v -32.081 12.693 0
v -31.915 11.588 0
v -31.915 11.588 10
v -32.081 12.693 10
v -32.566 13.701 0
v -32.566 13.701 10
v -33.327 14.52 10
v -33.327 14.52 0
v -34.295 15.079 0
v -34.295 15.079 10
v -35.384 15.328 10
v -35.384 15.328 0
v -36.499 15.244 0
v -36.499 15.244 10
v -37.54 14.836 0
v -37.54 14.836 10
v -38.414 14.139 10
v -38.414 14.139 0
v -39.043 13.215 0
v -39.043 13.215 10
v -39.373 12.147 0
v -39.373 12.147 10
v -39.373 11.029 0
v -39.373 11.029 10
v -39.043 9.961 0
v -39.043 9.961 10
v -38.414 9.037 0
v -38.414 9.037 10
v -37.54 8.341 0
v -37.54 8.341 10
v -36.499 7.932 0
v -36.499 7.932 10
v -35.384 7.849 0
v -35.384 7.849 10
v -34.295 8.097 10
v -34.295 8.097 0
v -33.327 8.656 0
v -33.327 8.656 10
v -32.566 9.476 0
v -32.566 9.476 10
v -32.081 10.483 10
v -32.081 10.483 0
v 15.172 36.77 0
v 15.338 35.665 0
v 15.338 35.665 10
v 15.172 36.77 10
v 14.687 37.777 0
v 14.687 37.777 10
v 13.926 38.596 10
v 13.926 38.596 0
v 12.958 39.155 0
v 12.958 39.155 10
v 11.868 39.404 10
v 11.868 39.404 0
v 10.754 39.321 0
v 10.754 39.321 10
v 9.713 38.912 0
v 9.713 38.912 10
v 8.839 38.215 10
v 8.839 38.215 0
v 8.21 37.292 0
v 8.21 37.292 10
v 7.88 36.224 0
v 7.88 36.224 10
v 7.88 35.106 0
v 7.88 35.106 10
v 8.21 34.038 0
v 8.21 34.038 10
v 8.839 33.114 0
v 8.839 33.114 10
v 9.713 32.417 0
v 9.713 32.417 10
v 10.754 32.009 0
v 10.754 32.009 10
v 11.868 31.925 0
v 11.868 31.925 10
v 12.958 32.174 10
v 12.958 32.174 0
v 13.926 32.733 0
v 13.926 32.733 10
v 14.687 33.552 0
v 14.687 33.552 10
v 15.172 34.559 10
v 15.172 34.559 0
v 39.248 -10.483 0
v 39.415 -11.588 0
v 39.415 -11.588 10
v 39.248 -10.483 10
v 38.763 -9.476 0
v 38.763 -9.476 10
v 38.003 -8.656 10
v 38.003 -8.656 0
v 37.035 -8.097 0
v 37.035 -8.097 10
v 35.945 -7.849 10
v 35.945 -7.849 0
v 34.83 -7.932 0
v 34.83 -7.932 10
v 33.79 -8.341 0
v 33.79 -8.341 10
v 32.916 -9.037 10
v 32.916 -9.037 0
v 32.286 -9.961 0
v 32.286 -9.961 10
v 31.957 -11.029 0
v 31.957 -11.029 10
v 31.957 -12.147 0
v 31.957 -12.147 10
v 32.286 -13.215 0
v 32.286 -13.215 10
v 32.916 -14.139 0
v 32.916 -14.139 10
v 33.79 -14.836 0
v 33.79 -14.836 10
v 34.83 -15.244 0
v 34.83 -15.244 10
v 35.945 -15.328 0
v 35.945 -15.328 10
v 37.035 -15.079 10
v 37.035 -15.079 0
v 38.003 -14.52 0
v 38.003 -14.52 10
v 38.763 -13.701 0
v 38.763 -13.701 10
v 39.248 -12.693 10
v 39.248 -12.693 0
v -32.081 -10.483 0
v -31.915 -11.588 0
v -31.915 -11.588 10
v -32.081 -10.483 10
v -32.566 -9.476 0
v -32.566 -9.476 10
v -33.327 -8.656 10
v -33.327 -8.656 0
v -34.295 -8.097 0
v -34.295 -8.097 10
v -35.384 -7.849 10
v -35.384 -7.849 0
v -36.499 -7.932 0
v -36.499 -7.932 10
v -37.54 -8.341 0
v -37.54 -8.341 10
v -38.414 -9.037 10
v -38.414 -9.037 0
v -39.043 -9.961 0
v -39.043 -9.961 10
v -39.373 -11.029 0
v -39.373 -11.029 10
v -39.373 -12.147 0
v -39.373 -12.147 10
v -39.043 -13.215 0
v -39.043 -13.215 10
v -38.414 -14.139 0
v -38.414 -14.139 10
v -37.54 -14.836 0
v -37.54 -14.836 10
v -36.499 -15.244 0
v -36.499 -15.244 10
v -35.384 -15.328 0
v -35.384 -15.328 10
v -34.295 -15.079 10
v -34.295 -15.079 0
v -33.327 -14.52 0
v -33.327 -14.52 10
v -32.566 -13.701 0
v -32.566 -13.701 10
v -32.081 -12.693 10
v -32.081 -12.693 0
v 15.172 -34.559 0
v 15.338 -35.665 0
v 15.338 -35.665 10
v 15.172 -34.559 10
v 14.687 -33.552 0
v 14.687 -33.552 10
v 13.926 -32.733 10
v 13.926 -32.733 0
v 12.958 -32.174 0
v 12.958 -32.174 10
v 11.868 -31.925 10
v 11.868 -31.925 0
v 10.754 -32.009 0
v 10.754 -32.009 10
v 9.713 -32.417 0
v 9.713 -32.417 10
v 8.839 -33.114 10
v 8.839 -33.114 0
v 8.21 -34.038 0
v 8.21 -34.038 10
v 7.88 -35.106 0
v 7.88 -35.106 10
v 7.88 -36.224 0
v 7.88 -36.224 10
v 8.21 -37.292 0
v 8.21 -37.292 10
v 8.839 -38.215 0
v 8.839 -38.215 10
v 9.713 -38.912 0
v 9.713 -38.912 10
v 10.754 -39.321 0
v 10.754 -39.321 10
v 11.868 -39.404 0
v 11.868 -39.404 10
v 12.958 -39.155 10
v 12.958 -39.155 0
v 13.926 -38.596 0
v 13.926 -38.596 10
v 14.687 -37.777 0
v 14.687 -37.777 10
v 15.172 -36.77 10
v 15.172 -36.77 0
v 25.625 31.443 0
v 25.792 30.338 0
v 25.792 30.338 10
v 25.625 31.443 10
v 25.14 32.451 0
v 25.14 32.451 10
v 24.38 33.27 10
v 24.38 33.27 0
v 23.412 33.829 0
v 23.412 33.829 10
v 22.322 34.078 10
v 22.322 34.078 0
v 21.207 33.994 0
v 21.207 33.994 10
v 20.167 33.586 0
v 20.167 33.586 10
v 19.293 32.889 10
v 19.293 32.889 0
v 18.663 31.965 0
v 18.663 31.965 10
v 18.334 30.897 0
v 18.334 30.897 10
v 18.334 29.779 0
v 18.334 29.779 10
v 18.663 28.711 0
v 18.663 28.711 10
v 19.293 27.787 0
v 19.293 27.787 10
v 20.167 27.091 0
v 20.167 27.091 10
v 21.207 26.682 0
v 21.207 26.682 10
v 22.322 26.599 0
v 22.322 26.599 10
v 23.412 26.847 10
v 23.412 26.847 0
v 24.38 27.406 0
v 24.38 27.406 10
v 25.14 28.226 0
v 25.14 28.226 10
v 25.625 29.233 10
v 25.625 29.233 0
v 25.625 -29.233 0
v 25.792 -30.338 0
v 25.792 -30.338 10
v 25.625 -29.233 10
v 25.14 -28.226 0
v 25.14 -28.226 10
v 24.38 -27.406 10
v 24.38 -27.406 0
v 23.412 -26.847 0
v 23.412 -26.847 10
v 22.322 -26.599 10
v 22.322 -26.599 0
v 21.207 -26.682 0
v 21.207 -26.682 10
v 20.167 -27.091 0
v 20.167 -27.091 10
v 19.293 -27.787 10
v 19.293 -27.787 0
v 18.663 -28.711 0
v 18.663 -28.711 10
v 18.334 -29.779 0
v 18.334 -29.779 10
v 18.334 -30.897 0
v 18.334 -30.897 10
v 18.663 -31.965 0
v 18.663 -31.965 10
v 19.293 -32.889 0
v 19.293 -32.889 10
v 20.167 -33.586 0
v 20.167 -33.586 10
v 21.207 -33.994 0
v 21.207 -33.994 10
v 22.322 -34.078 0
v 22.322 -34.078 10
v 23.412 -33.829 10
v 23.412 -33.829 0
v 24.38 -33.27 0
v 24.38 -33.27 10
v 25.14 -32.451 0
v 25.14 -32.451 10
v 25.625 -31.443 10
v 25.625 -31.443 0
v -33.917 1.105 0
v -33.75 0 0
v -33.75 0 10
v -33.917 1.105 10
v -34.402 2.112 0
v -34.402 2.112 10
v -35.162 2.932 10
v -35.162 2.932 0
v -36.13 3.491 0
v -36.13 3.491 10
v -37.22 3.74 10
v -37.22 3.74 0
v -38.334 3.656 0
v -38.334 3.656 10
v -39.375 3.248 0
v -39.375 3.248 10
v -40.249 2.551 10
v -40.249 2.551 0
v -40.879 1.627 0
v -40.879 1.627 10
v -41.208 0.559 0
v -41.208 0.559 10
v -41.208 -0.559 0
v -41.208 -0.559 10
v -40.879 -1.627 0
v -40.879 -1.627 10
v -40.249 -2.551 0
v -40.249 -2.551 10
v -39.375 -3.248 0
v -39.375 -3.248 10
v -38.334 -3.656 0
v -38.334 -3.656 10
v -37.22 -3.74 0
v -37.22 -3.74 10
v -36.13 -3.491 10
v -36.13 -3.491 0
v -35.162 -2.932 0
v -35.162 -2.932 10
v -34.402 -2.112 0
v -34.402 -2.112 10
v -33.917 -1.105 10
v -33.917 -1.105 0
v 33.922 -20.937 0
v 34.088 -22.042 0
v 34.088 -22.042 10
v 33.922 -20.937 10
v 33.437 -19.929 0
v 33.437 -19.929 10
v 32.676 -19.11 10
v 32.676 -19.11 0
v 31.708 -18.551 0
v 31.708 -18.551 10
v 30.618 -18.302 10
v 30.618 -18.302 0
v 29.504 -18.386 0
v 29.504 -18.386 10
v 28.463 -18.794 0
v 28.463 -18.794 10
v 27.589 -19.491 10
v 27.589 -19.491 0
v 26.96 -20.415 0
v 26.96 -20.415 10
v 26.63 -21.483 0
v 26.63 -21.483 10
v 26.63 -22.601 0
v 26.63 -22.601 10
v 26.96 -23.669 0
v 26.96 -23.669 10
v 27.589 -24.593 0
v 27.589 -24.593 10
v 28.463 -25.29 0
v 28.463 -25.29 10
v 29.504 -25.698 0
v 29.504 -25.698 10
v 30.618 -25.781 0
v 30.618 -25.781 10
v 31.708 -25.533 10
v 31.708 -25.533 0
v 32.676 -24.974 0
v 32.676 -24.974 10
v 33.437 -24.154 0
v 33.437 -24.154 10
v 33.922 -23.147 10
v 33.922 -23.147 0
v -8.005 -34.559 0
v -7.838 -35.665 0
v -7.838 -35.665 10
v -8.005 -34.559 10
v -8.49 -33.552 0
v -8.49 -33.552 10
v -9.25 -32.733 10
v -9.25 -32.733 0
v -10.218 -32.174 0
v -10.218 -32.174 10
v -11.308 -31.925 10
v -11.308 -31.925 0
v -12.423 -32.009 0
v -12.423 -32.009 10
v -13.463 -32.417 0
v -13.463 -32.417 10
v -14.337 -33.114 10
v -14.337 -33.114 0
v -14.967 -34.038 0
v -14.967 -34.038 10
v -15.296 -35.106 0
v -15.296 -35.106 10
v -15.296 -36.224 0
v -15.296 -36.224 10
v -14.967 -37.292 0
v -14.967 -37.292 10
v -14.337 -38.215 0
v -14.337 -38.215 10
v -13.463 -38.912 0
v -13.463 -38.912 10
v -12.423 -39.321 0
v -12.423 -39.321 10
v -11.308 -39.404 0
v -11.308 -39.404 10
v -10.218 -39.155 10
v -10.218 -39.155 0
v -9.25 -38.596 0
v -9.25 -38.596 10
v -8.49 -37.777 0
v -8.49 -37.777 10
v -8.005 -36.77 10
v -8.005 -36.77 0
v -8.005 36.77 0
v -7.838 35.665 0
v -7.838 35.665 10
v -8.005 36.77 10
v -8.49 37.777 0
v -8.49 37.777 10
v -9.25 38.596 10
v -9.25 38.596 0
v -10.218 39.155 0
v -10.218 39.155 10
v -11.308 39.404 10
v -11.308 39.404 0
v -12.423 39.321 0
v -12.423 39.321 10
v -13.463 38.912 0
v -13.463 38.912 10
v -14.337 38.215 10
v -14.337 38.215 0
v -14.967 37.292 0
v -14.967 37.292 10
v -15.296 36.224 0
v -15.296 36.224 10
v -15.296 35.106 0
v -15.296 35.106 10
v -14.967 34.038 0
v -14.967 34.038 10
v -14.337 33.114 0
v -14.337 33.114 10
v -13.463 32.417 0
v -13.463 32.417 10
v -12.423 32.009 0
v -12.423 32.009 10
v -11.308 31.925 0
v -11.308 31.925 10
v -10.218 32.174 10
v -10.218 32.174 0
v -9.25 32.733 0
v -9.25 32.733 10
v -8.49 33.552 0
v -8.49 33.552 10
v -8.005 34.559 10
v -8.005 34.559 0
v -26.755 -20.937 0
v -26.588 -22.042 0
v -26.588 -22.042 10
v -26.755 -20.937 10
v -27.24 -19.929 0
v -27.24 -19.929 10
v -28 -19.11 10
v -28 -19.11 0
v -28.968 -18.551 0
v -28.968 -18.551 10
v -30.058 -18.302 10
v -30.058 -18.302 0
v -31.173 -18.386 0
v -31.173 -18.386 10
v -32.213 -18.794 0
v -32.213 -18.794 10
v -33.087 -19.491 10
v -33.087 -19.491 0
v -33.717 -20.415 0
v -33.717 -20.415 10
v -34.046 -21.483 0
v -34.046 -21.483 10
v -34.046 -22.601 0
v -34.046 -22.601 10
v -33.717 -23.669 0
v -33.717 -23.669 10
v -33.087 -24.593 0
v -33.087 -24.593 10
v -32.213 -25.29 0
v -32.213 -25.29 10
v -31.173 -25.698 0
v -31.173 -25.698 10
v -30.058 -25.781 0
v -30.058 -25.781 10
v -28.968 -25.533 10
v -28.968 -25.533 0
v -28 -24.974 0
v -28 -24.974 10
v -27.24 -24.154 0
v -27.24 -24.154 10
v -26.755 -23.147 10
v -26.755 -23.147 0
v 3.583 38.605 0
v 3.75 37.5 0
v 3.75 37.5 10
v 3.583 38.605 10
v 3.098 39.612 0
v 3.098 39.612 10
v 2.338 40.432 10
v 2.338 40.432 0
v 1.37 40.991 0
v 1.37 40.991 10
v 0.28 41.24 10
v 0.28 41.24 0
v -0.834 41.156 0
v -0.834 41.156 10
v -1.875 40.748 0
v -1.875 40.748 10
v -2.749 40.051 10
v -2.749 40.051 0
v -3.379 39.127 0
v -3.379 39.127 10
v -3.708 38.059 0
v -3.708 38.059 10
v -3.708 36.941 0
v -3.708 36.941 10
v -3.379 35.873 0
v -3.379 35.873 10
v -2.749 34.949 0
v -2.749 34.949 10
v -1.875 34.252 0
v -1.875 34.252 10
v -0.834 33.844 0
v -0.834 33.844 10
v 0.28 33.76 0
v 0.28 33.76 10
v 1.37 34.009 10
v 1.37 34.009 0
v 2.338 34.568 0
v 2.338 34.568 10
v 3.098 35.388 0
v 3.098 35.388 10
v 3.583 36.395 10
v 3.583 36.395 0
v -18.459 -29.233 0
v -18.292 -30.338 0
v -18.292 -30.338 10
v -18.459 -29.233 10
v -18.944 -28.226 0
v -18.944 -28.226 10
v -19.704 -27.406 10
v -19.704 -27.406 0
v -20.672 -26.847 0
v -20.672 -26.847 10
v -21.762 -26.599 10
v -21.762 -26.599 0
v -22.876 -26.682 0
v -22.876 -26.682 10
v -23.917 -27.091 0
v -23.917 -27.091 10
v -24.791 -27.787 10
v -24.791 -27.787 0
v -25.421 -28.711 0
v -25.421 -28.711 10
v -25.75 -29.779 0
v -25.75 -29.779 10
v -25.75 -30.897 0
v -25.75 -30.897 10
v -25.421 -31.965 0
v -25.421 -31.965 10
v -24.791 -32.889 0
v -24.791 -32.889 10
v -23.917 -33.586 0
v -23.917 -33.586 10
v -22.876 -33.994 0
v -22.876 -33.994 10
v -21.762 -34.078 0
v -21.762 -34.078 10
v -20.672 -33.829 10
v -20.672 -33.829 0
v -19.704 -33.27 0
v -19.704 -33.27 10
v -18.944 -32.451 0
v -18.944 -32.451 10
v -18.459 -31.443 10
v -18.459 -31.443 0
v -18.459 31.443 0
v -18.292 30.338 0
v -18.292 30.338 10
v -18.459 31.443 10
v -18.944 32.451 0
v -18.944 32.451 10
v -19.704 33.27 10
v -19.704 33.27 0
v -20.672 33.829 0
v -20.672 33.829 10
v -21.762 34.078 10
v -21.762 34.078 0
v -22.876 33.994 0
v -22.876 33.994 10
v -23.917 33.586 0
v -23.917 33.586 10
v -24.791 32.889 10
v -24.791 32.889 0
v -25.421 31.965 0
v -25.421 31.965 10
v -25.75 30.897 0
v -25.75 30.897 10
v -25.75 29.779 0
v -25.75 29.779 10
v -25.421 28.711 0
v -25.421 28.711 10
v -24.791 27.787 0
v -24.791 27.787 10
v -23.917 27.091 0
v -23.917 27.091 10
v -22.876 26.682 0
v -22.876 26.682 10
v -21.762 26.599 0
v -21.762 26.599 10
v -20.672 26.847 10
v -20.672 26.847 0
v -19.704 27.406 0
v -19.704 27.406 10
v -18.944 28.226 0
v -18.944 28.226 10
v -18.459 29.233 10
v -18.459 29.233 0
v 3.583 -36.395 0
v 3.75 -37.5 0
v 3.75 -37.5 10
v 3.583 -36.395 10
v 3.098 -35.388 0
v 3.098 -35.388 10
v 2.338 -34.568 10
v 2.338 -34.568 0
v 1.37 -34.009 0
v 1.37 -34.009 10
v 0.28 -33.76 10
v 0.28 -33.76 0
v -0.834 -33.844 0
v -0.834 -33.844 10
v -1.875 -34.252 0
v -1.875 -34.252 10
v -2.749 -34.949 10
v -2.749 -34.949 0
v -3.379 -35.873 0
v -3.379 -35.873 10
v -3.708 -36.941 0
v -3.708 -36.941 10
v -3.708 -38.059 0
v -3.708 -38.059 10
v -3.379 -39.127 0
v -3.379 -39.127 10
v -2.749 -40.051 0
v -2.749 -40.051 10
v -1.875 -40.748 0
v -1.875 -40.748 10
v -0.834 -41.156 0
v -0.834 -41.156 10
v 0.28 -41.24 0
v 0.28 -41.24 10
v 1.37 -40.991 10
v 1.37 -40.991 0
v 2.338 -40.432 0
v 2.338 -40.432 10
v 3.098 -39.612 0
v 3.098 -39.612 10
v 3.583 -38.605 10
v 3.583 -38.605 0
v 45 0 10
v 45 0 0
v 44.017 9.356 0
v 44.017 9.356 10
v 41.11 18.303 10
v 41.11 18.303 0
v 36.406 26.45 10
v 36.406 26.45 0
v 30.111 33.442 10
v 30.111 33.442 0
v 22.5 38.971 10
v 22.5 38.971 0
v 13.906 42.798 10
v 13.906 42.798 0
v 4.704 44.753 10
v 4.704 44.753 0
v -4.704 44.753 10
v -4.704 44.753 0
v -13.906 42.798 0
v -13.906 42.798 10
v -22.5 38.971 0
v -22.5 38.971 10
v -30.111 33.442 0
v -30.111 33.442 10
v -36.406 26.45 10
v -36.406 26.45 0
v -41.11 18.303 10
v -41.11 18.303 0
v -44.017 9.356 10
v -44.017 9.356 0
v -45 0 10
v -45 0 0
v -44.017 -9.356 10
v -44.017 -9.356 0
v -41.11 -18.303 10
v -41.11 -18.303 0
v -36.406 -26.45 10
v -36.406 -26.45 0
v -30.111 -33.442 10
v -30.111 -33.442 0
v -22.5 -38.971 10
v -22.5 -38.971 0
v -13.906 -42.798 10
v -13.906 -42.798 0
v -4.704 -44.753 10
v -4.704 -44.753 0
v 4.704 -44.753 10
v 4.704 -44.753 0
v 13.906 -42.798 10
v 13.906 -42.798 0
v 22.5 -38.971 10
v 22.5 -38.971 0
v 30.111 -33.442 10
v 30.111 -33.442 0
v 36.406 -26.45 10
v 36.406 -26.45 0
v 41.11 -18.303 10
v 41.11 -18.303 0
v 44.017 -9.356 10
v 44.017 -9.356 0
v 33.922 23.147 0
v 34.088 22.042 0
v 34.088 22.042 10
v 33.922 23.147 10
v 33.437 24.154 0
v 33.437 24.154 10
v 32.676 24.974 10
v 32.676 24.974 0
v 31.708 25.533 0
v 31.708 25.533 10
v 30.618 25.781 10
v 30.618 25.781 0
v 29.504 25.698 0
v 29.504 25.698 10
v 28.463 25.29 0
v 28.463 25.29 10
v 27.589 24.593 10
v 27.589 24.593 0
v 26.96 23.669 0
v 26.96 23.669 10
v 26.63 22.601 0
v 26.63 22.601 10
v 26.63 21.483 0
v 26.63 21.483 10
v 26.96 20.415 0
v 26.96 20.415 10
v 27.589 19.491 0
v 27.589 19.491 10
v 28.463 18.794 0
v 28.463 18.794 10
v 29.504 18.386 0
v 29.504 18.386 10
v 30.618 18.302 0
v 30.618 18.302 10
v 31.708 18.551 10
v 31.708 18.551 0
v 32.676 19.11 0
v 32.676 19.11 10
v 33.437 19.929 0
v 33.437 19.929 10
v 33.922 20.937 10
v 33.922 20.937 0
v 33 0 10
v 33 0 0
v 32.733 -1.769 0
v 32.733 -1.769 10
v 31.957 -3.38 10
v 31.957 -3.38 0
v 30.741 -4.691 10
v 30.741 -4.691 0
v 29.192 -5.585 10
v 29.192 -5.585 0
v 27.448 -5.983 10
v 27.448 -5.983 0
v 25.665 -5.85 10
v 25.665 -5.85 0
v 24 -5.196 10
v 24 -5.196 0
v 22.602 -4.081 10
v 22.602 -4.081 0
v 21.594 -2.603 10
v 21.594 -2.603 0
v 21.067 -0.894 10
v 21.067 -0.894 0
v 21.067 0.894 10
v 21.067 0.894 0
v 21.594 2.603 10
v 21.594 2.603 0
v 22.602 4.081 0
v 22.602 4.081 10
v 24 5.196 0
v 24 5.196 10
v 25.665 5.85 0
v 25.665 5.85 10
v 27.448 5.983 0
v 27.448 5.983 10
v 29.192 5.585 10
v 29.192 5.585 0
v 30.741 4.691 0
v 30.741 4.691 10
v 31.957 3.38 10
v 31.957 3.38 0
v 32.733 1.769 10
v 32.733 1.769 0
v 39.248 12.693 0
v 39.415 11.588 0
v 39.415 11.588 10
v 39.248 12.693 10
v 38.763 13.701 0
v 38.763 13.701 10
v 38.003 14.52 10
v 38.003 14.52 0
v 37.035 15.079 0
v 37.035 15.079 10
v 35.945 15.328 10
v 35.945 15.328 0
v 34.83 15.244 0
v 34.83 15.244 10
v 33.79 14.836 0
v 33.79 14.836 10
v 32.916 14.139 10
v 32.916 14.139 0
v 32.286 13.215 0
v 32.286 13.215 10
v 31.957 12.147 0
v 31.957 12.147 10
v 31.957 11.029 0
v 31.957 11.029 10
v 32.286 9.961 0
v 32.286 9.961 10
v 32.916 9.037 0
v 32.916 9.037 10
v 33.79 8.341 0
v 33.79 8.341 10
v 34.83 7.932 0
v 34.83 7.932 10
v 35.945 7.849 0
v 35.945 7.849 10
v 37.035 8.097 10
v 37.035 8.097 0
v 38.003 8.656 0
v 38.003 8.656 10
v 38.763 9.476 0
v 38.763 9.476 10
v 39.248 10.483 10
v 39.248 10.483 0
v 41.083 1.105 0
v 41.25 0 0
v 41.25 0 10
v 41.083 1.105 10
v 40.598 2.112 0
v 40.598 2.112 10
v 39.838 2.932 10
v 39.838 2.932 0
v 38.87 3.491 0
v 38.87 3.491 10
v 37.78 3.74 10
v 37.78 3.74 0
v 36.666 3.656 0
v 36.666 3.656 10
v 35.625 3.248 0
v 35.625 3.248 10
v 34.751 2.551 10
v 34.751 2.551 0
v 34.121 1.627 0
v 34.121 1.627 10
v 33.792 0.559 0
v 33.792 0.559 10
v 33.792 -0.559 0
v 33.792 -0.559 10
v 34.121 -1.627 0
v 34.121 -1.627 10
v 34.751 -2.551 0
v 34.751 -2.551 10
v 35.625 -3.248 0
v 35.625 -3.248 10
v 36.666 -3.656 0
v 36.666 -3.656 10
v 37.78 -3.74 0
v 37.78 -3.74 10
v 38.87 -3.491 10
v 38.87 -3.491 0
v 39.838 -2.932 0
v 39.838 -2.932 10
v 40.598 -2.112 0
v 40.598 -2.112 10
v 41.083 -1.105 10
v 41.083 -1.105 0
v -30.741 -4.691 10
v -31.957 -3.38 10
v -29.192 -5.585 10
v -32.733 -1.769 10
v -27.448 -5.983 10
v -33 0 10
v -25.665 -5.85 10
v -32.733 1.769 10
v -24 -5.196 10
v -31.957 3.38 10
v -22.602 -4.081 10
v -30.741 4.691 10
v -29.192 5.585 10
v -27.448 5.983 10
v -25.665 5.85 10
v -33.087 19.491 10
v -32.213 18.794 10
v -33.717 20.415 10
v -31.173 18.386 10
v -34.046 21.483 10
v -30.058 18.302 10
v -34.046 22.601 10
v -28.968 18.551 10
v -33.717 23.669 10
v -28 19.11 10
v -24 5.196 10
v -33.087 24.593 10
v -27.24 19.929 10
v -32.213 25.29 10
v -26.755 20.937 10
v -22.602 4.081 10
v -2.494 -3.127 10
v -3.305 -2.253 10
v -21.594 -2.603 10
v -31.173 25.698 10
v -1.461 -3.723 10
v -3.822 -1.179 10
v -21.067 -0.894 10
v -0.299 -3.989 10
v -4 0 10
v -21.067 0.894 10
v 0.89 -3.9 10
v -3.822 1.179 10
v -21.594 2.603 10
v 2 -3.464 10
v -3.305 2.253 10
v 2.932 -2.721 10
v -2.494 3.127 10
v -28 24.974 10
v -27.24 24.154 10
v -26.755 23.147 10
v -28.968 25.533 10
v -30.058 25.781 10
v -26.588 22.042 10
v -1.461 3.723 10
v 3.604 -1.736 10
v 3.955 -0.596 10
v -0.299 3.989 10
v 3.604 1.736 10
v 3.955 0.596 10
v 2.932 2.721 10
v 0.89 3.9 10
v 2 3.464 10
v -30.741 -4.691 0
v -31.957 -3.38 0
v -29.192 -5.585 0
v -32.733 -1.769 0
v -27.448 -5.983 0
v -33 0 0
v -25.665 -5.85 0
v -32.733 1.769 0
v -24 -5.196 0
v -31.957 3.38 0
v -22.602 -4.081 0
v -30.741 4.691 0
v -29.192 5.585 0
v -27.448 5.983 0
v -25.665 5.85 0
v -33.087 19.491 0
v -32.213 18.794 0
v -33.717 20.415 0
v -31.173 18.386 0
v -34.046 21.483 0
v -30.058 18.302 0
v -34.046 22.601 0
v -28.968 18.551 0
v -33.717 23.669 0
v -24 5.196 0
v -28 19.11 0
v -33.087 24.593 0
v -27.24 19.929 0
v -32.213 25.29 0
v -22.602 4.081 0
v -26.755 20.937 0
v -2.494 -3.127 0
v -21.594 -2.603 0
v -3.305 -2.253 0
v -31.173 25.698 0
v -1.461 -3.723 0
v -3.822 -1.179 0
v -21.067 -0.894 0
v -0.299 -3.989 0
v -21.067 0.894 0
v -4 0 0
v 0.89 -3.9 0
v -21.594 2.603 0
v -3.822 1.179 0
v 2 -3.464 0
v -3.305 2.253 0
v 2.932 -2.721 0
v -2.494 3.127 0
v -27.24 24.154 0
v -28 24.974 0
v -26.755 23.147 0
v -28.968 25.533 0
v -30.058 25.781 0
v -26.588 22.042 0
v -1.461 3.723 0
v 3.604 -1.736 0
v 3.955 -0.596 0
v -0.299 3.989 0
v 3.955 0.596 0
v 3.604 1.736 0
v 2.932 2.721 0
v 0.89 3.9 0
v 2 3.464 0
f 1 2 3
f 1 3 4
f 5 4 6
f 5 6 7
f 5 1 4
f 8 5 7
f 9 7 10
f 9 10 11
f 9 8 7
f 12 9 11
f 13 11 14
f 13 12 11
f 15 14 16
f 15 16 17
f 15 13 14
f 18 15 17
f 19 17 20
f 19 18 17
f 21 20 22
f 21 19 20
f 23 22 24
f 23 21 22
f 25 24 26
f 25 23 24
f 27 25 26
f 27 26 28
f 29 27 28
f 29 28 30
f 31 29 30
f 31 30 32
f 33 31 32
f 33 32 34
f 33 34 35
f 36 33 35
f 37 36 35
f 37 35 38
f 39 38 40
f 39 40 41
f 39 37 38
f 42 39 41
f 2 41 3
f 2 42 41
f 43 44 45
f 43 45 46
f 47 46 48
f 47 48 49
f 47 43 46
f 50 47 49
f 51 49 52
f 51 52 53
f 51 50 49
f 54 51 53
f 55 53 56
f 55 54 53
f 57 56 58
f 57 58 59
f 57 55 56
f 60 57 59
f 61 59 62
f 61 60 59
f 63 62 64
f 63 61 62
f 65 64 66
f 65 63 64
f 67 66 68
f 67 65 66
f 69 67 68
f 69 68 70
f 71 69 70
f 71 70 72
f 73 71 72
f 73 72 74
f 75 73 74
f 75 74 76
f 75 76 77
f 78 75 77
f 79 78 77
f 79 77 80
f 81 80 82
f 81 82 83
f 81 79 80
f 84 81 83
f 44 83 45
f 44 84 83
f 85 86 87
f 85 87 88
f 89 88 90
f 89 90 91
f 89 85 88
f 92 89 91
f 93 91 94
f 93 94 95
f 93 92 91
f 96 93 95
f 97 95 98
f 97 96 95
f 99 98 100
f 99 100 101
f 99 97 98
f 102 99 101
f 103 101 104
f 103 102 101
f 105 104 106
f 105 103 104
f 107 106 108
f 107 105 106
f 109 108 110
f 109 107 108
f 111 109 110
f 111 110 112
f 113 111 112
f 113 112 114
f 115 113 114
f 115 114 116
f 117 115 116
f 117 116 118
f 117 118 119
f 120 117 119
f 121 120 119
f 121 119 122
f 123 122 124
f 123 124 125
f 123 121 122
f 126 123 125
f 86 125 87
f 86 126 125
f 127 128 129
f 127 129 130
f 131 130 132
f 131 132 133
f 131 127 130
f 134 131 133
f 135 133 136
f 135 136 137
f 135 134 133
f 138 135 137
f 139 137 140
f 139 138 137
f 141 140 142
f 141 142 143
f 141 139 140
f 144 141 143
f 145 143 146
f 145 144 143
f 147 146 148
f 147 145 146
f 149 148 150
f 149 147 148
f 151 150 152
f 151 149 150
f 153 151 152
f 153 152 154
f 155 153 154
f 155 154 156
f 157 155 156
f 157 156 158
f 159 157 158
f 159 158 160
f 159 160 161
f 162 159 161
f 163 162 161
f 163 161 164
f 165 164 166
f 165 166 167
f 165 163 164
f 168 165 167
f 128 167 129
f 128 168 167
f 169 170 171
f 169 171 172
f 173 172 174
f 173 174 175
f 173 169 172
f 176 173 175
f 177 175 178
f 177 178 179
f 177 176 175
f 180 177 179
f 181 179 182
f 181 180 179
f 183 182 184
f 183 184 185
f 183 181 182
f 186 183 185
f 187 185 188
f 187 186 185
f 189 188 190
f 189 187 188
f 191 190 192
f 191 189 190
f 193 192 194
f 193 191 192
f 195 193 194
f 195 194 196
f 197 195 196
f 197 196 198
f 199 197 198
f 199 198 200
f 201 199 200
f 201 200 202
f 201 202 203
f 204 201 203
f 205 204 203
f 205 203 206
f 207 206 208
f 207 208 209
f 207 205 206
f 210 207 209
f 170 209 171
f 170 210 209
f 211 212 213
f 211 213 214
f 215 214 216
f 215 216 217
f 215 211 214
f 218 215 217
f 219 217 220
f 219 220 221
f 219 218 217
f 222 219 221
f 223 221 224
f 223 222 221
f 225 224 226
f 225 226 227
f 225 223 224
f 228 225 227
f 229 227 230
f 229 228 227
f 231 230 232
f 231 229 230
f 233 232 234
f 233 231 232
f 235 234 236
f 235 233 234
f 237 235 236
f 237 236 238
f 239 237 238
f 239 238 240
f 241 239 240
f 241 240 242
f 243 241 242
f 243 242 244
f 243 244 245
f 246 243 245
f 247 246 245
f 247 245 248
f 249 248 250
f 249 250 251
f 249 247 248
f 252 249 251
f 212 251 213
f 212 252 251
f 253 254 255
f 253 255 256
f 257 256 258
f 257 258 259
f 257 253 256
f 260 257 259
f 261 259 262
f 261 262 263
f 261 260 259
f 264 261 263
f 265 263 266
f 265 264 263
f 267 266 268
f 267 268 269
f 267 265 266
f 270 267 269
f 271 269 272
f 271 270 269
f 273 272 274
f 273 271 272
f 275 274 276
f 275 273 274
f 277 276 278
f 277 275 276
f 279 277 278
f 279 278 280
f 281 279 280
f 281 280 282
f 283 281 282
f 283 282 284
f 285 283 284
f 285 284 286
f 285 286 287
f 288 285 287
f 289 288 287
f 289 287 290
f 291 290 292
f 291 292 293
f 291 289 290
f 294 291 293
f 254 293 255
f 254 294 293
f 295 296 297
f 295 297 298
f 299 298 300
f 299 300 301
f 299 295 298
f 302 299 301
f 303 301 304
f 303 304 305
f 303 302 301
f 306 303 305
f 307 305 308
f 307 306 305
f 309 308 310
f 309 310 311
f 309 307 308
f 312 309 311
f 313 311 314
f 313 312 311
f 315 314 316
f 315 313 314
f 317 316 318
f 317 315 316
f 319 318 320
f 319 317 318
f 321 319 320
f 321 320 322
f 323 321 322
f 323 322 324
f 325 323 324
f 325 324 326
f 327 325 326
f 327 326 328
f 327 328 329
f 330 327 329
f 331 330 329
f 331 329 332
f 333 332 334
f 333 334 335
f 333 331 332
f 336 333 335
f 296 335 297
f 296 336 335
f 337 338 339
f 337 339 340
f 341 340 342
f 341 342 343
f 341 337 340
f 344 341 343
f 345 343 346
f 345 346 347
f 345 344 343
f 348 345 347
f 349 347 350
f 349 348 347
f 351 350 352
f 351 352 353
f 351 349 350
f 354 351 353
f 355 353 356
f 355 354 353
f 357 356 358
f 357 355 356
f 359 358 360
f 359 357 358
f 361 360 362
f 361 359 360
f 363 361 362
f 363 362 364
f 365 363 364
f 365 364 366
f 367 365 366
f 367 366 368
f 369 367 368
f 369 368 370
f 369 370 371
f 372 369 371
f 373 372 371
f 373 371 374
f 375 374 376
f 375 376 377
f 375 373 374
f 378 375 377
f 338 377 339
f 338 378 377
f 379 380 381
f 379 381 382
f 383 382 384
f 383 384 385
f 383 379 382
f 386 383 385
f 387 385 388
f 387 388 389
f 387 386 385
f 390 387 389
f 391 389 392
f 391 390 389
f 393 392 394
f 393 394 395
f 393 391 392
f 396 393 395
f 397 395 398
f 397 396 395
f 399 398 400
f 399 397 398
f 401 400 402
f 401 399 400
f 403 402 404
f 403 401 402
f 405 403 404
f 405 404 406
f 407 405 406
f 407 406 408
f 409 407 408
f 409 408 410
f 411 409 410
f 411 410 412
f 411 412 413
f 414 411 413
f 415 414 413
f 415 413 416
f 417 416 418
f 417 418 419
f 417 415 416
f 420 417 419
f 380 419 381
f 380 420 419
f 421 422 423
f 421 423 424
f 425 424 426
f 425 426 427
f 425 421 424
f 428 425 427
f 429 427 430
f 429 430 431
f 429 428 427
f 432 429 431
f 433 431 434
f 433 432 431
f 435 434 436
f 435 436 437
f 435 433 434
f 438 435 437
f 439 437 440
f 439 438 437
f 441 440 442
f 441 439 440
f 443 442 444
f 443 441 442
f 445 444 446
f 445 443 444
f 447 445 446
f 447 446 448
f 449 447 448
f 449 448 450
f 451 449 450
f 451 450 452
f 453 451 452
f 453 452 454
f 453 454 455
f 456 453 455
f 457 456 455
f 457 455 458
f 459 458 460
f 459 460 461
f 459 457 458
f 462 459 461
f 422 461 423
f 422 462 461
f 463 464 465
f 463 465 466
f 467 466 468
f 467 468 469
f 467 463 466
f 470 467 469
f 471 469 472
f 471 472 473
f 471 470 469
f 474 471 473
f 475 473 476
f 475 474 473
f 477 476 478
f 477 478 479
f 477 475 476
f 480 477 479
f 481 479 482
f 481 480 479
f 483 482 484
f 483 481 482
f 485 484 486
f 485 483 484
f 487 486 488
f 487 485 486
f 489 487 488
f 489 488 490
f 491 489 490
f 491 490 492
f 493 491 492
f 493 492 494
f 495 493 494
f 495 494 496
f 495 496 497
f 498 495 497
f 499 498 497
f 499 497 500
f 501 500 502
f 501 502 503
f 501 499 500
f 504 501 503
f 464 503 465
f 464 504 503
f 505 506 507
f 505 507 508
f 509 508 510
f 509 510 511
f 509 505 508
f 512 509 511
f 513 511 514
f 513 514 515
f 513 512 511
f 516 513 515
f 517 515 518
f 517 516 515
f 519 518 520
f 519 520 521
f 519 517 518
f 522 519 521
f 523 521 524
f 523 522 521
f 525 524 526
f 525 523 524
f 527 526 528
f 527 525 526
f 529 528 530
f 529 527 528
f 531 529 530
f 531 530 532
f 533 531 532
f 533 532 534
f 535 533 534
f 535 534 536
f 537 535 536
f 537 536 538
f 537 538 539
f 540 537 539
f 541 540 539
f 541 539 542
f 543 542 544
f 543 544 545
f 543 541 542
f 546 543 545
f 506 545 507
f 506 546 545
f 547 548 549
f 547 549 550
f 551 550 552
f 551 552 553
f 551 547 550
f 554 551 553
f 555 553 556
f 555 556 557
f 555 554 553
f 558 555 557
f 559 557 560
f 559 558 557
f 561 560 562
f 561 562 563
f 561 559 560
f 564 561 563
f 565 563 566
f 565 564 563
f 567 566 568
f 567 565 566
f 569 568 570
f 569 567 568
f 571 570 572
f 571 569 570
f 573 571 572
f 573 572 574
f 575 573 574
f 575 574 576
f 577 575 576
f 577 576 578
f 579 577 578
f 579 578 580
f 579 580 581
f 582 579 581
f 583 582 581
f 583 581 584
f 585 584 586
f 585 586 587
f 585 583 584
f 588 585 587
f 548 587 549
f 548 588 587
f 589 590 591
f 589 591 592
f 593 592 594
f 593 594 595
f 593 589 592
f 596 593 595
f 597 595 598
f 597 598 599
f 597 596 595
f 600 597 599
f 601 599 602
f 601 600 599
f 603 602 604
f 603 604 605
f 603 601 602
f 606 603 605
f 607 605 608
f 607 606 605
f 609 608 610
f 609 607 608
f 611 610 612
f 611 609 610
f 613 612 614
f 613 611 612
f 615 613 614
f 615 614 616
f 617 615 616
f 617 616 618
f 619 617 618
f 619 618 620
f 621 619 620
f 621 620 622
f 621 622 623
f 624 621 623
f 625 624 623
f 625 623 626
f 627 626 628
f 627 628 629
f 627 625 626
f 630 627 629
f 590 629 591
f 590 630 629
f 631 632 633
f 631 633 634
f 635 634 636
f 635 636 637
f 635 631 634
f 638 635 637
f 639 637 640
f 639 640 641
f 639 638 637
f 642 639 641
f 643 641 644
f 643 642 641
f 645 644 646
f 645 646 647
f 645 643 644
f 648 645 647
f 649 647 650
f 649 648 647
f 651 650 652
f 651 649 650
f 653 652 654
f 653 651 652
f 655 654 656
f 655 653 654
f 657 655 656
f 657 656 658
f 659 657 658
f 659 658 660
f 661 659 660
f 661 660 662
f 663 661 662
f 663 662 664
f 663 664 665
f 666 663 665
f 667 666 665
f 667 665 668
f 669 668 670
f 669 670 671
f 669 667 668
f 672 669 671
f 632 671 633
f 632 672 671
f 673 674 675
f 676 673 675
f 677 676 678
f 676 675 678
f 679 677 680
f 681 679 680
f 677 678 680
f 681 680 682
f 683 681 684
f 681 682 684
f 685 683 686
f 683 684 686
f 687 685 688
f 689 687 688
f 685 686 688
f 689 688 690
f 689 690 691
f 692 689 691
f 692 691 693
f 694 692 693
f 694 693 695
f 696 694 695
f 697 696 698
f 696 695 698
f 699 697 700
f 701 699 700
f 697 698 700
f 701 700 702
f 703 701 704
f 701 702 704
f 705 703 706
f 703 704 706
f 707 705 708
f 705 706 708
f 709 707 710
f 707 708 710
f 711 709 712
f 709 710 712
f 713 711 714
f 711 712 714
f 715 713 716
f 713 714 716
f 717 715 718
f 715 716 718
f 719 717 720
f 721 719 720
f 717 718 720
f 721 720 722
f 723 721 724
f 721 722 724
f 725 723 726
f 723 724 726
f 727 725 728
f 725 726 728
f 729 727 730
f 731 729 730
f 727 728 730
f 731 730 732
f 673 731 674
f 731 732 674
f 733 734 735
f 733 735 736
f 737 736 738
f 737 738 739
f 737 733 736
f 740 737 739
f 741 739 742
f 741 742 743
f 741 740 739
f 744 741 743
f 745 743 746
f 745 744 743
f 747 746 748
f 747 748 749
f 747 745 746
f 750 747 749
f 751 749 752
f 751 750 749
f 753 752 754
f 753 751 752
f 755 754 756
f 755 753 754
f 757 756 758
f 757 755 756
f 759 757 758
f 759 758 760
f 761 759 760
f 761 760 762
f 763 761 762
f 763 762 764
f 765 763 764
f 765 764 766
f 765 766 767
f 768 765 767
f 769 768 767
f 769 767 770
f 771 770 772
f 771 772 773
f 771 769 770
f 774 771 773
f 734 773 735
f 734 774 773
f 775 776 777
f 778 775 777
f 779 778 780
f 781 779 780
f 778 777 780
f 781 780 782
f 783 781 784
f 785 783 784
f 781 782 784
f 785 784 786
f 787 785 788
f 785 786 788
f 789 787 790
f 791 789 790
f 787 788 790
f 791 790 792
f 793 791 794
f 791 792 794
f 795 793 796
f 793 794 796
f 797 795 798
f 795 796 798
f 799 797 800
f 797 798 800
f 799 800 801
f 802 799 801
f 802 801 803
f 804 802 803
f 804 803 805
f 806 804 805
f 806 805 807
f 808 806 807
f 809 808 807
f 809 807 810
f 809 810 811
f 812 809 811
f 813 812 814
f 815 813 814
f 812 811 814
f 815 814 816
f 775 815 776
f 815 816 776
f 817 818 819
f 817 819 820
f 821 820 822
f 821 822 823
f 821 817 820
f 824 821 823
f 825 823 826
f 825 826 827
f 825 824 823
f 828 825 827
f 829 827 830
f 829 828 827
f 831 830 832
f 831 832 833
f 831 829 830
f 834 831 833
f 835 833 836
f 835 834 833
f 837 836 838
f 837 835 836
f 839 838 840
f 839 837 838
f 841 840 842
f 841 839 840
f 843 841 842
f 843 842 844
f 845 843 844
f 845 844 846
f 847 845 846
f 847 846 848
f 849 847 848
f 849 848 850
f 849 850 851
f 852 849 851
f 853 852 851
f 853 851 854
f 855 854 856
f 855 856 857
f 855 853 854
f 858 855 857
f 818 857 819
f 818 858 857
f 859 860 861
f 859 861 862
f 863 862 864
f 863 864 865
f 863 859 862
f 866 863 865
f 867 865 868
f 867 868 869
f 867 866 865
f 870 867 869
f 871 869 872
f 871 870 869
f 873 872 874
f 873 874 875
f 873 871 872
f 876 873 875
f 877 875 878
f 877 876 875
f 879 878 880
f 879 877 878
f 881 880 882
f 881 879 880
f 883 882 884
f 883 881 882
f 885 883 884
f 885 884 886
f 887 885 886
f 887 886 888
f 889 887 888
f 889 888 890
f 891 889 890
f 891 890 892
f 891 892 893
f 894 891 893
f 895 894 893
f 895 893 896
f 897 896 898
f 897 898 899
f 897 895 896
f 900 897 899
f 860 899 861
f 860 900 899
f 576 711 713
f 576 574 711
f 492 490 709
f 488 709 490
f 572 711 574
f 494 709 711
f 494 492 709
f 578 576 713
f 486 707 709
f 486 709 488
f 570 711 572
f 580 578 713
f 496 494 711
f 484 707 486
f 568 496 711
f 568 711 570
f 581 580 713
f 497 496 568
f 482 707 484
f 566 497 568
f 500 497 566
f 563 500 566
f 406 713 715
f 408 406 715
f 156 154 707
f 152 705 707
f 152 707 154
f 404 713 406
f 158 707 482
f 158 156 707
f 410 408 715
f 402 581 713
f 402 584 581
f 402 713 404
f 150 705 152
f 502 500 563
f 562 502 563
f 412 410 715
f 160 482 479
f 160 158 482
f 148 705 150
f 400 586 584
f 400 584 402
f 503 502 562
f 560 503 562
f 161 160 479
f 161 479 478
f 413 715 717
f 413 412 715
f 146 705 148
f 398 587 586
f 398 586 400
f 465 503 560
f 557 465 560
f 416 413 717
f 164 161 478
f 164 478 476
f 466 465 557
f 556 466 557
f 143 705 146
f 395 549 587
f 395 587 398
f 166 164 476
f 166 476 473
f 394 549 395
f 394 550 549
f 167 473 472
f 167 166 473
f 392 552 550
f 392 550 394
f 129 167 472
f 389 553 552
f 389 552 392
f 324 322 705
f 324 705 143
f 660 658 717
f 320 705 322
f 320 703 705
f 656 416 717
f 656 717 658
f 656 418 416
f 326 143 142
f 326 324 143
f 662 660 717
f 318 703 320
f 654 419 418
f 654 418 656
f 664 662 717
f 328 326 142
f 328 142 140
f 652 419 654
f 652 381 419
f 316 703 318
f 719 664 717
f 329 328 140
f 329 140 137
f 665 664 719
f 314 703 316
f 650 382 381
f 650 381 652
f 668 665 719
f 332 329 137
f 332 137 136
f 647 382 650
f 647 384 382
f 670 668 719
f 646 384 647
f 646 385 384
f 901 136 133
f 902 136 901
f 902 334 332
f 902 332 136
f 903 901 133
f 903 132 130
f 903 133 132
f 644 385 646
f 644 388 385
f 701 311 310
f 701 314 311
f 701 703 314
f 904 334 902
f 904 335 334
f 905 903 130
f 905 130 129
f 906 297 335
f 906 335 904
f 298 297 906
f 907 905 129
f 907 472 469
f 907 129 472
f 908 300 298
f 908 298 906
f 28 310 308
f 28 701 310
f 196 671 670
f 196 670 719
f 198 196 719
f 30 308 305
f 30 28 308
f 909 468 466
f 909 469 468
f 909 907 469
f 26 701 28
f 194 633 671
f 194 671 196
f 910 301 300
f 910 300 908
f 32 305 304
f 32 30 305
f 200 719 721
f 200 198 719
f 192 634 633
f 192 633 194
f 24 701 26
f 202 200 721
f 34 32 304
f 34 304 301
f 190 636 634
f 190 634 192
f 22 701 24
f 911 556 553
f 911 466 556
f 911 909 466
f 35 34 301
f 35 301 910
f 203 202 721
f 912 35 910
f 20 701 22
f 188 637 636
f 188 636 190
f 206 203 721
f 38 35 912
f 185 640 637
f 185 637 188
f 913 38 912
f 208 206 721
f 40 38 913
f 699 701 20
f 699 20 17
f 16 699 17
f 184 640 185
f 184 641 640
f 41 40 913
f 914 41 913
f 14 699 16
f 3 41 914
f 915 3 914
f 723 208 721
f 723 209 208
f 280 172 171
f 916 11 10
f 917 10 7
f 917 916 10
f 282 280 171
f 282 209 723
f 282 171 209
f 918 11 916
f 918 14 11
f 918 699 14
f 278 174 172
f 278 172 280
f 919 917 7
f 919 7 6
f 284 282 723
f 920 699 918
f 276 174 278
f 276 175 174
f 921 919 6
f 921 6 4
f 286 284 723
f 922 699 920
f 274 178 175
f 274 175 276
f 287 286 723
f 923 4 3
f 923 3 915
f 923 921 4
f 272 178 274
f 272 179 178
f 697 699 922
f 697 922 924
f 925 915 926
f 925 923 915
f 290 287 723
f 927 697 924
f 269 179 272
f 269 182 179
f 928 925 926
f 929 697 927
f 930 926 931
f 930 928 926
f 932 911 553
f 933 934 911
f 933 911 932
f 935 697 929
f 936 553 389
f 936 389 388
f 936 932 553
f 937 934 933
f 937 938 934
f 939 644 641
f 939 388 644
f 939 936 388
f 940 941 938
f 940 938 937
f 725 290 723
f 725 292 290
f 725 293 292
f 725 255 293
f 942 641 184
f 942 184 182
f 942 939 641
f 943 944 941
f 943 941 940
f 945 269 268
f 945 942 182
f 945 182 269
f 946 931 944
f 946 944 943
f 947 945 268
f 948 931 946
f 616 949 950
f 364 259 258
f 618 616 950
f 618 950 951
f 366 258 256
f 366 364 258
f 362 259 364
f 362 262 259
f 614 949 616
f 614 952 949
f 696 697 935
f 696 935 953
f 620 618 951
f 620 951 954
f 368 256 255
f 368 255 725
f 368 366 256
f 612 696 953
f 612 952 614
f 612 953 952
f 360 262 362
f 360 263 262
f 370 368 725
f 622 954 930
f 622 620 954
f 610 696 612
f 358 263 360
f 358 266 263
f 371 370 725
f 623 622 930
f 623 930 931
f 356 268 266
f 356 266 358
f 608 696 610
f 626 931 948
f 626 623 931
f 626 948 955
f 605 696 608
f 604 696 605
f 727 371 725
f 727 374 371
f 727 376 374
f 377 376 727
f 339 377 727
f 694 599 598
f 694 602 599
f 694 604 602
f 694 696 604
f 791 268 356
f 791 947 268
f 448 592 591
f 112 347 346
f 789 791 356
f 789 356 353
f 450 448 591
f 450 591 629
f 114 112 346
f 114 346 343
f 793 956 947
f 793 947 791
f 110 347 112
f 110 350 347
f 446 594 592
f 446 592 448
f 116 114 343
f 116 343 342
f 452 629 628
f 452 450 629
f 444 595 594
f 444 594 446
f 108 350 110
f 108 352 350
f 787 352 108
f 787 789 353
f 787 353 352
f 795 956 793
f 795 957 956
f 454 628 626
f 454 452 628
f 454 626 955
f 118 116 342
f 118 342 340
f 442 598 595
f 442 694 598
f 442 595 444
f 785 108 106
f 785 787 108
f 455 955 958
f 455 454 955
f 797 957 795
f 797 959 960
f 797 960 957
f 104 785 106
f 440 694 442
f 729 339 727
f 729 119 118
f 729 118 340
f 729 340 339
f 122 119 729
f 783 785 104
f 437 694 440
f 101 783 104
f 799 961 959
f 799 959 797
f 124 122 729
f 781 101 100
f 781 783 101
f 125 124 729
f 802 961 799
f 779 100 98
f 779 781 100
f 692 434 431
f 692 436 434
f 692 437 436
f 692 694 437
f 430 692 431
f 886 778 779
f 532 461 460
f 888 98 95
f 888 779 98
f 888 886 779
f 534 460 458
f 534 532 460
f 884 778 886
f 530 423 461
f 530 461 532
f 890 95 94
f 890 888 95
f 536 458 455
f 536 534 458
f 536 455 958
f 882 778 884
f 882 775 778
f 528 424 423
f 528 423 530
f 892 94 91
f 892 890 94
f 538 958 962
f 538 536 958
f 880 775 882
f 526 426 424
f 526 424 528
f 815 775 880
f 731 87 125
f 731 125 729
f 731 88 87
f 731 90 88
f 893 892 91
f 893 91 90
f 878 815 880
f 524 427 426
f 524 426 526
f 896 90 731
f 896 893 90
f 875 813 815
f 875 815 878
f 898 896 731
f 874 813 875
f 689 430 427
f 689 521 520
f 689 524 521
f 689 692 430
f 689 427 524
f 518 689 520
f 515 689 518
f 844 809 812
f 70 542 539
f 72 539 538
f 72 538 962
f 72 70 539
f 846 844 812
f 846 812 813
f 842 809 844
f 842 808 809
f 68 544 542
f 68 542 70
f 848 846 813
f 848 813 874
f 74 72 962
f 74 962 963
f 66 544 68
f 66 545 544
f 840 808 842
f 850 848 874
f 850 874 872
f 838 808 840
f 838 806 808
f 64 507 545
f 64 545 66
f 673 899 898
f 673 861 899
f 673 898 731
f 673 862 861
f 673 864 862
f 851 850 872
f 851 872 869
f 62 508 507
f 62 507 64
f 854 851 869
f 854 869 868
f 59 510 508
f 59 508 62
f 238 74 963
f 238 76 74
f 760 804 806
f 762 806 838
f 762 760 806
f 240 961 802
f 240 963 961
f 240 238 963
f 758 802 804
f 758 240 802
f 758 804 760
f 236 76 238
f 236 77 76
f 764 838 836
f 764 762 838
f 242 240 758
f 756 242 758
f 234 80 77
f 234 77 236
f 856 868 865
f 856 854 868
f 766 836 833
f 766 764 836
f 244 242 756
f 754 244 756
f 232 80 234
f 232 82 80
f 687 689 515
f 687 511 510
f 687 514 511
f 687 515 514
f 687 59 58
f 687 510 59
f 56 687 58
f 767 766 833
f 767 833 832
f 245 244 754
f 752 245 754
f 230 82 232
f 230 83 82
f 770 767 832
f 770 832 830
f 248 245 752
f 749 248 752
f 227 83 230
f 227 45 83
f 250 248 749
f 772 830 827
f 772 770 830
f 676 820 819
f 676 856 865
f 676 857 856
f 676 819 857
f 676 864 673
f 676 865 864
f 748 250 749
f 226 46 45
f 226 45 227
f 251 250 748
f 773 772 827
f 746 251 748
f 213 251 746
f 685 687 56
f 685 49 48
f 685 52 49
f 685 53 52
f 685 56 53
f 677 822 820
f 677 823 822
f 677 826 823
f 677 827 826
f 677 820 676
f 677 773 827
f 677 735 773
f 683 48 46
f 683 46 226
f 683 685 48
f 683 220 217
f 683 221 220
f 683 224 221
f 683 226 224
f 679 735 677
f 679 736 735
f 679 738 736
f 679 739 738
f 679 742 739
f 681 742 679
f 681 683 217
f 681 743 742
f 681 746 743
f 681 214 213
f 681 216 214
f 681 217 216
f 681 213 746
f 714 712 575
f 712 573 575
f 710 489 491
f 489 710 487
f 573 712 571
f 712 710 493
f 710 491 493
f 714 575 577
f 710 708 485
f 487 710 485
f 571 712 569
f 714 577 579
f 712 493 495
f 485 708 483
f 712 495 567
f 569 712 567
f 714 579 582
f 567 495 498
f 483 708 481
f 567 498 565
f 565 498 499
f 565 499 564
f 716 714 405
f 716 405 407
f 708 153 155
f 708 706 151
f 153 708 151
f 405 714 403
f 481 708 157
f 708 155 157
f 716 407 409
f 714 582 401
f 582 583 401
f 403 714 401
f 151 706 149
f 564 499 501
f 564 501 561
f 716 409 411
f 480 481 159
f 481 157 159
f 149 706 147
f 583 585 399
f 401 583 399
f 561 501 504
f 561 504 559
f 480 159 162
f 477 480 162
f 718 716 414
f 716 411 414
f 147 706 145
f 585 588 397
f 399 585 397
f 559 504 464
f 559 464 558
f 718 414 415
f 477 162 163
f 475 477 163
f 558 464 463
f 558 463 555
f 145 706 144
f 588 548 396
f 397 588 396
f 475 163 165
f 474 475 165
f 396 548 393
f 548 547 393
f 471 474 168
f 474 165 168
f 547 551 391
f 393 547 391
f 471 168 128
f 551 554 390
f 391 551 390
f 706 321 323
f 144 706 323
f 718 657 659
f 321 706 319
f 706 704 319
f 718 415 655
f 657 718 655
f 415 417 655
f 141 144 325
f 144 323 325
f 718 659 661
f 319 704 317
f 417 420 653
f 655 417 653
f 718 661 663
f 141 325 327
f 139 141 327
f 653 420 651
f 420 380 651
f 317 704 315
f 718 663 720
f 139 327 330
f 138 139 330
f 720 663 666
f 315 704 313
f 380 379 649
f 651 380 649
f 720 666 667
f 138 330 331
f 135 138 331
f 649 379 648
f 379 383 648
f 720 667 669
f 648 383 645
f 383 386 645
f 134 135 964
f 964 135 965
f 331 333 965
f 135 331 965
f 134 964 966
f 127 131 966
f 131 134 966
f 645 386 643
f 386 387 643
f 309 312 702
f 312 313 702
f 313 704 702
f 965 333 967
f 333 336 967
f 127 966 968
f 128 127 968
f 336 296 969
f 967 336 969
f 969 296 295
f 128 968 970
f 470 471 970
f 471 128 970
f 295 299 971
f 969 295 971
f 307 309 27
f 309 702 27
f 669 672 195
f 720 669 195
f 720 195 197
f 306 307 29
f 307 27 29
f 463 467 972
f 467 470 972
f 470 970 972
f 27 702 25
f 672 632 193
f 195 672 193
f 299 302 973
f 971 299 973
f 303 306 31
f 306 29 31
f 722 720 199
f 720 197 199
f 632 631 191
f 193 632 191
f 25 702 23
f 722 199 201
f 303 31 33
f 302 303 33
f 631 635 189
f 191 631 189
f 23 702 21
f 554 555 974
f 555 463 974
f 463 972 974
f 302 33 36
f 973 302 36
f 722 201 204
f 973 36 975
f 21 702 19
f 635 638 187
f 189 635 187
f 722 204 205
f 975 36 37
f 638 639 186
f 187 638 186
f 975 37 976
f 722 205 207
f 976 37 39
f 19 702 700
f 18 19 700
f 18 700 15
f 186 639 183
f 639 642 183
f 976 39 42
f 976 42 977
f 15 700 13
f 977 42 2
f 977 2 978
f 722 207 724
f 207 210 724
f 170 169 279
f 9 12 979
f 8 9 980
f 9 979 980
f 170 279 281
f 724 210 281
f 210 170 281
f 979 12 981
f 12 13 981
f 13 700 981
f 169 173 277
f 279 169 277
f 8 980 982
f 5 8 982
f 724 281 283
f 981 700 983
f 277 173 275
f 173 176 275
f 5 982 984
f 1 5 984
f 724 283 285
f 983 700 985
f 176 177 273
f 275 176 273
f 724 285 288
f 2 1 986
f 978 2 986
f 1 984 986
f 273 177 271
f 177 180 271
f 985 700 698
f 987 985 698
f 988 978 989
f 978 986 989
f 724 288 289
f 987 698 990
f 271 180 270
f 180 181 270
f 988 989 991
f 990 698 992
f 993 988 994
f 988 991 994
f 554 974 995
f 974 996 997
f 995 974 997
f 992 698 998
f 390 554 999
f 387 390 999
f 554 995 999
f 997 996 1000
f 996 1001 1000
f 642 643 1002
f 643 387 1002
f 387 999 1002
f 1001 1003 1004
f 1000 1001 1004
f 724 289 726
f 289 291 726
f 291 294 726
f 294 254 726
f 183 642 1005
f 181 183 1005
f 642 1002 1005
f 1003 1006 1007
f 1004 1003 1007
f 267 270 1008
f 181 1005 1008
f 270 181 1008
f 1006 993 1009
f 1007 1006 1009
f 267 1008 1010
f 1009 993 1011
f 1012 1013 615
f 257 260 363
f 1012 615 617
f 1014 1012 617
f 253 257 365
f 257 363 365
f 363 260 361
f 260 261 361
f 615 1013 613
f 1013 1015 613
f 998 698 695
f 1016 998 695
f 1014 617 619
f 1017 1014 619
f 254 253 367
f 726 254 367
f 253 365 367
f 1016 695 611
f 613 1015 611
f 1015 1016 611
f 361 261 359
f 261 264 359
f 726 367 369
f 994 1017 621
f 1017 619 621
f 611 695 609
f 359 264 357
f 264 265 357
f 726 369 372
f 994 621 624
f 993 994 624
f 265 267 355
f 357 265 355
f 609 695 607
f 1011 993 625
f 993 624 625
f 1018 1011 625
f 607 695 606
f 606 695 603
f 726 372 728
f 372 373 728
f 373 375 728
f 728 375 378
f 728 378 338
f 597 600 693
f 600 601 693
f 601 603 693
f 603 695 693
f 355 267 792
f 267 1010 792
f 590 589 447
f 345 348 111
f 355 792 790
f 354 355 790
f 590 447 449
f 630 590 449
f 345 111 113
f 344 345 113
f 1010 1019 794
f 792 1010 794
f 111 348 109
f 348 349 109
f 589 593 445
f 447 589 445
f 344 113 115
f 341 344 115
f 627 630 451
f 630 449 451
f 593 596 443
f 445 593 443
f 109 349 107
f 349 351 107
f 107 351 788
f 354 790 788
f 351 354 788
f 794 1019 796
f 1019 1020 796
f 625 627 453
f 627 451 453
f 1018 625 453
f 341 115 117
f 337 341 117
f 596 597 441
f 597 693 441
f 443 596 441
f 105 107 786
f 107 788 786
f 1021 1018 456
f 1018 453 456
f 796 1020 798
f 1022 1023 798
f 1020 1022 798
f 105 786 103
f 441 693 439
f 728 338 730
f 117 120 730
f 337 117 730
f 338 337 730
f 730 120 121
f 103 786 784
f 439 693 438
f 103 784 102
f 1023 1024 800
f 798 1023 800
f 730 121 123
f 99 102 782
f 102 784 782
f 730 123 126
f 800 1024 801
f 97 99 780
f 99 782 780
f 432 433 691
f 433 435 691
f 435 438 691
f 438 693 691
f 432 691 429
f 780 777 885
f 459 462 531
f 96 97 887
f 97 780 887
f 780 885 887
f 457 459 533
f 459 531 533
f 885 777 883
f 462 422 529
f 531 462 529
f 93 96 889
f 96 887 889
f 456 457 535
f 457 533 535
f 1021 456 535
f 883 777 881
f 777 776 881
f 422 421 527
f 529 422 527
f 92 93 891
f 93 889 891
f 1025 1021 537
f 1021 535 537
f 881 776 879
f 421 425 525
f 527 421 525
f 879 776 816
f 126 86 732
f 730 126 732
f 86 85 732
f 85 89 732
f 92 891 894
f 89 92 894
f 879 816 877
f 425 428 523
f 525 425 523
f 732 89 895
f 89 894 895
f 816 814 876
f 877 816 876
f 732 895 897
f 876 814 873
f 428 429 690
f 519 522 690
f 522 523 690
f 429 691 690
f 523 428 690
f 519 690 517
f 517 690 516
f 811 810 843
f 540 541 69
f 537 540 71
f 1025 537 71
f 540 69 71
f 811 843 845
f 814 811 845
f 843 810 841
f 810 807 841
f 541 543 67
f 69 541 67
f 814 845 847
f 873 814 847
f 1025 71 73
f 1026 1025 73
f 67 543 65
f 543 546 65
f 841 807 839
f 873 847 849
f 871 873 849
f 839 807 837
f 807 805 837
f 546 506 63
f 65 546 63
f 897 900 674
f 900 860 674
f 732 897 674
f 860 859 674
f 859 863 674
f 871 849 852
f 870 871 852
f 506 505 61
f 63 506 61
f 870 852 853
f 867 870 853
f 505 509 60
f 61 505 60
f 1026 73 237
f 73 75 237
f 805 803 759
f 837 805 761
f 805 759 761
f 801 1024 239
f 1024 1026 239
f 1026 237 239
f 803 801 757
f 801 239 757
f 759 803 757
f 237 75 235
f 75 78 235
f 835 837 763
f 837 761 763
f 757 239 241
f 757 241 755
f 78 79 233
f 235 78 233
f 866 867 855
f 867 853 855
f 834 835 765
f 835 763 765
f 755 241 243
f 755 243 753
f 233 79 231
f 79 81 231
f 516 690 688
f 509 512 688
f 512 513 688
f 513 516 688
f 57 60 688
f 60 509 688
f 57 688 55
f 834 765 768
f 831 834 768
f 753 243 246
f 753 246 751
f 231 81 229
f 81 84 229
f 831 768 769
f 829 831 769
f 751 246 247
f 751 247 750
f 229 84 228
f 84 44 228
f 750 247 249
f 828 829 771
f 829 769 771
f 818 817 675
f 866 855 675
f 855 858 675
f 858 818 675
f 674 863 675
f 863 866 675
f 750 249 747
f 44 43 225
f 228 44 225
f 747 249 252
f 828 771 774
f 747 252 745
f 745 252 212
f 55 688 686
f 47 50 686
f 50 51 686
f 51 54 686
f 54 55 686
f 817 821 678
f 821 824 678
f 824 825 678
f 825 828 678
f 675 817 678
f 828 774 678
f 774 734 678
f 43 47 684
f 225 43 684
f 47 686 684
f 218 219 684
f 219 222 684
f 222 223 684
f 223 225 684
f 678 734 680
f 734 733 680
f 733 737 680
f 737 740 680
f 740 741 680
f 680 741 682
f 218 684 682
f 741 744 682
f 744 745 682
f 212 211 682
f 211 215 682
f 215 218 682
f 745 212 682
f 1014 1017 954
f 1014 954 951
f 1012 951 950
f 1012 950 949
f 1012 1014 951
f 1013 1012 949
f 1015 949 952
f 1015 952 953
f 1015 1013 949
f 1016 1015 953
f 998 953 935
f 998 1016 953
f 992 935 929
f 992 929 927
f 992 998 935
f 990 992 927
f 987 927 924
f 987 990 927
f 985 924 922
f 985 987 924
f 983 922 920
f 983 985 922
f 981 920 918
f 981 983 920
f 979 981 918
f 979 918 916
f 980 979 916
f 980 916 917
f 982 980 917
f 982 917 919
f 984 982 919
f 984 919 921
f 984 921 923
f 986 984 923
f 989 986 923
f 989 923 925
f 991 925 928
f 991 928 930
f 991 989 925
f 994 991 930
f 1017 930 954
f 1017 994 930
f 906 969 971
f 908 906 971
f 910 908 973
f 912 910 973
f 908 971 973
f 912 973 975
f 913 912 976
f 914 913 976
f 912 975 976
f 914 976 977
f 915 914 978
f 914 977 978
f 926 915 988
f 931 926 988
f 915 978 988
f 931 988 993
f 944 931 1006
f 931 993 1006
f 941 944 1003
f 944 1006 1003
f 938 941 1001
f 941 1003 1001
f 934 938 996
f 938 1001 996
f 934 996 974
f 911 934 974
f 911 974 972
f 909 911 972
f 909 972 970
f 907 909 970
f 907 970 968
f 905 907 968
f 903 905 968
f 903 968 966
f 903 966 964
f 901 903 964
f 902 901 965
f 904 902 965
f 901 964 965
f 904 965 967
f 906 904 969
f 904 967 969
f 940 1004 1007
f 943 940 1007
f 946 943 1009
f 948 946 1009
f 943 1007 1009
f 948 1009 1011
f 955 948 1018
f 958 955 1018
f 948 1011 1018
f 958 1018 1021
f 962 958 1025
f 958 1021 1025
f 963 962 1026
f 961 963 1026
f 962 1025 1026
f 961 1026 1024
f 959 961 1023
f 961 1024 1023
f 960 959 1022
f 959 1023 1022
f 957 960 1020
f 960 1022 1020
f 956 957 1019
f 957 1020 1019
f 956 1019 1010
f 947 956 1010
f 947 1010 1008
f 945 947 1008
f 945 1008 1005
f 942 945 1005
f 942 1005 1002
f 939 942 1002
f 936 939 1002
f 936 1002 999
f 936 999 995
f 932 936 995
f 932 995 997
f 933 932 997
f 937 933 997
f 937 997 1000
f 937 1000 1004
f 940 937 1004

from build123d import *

# Parameters (mm, degrees)
SKETCH1_R           = 45
SKETCH1_R_2         = 3.75
BOSS_EXTRUDE1_DEPTH = 10
SKETCH2_R           = 6
CUT_EXTRUDE1_DEPTH  = 10
SKETCH3_R           = 4
CUT_EXTRUDE2_DEPTH  = 13


with BuildPart() as part:
    # Sketch1 → Boss-Extrude1 (new body)
    with BuildSketch(Plane.XY):
        Circle(SKETCH1_R)
        with Locations((0, 37.5)):
            Circle(SKETCH1_R_2, mode=Mode.SUBTRACT)
        with Locations((11.588137289, 35.664619361)):
            Circle(SKETCH1_R_2, mode=Mode.SUBTRACT)
        with Locations((22.041946961, 30.338137289)):
            Circle(SKETCH1_R_2, mode=Mode.SUBTRACT)
        with Locations((30.338137289, 22.041946961)):
            Circle(SKETCH1_R_2, mode=Mode.SUBTRACT)
        with Locations((35.664619361, 11.588137289)):
            Circle(SKETCH1_R_2, mode=Mode.SUBTRACT)
        with Locations((37.5, 0)):
            Circle(SKETCH1_R_2, mode=Mode.SUBTRACT)
        with Locations((35.664619361, -11.588137289)):
            Circle(SKETCH1_R_2, mode=Mode.SUBTRACT)
        with Locations((30.338137289, -22.041946961)):
            Circle(SKETCH1_R_2, mode=Mode.SUBTRACT)
        with Locations((22.041946961, -30.338137289)):
            Circle(SKETCH1_R_2, mode=Mode.SUBTRACT)
        with Locations((11.588137289, -35.664619361)):
            Circle(SKETCH1_R_2, mode=Mode.SUBTRACT)
        with Locations((0, -37.5)):
            Circle(SKETCH1_R_2, mode=Mode.SUBTRACT)
        with Locations((-11.588137289, -35.664619361)):
            Circle(SKETCH1_R_2, mode=Mode.SUBTRACT)
        with Locations((-22.041946961, -30.338137289)):
            Circle(SKETCH1_R_2, mode=Mode.SUBTRACT)
        with Locations((-30.338137289, -22.041946961)):
            Circle(SKETCH1_R_2, mode=Mode.SUBTRACT)
        with Locations((-35.664619361, -11.588137289)):
            Circle(SKETCH1_R_2, mode=Mode.SUBTRACT)
        with Locations((-37.5, 0)):
            Circle(SKETCH1_R_2, mode=Mode.SUBTRACT)
        with Locations((-35.664619361, 11.588137289)):
            Circle(SKETCH1_R_2, mode=Mode.SUBTRACT)
        with Locations((-30.338137289, 22.041946961)):
            Circle(SKETCH1_R_2, mode=Mode.SUBTRACT)
        with Locations((-22.041946961, 30.338137289)):
            Circle(SKETCH1_R_2, mode=Mode.SUBTRACT)
        with Locations((-11.588137289, 35.664619361)):
            Circle(SKETCH1_R_2, mode=Mode.SUBTRACT)
    extrude(amount=BOSS_EXTRUDE1_DEPTH)

    # Sketch2 → Cut-Extrude1 (cut)
    with BuildSketch(Plane(origin=(0, 0, 0), x_dir=(-1, 0, 0), z_dir=(0, 0, -1))):
        with Locations((27, 0)):
            Circle(SKETCH2_R)
        with Locations(Location((-27, 0, 0), (0, 0, 180))):
            Circle(SKETCH2_R)
    extrude(amount=-CUT_EXTRUDE1_DEPTH, mode=Mode.SUBTRACT)

    # Sketch3 → Cut-Extrude2 (cut)
    with BuildSketch(Plane(origin=(0, 0, 0), x_dir=(-1, 0, 0), z_dir=(0, 0, -1))):
        Circle(SKETCH3_R)
    extrude(amount=-CUT_EXTRUDE2_DEPTH, mode=Mode.SUBTRACT)


solid = part.part
